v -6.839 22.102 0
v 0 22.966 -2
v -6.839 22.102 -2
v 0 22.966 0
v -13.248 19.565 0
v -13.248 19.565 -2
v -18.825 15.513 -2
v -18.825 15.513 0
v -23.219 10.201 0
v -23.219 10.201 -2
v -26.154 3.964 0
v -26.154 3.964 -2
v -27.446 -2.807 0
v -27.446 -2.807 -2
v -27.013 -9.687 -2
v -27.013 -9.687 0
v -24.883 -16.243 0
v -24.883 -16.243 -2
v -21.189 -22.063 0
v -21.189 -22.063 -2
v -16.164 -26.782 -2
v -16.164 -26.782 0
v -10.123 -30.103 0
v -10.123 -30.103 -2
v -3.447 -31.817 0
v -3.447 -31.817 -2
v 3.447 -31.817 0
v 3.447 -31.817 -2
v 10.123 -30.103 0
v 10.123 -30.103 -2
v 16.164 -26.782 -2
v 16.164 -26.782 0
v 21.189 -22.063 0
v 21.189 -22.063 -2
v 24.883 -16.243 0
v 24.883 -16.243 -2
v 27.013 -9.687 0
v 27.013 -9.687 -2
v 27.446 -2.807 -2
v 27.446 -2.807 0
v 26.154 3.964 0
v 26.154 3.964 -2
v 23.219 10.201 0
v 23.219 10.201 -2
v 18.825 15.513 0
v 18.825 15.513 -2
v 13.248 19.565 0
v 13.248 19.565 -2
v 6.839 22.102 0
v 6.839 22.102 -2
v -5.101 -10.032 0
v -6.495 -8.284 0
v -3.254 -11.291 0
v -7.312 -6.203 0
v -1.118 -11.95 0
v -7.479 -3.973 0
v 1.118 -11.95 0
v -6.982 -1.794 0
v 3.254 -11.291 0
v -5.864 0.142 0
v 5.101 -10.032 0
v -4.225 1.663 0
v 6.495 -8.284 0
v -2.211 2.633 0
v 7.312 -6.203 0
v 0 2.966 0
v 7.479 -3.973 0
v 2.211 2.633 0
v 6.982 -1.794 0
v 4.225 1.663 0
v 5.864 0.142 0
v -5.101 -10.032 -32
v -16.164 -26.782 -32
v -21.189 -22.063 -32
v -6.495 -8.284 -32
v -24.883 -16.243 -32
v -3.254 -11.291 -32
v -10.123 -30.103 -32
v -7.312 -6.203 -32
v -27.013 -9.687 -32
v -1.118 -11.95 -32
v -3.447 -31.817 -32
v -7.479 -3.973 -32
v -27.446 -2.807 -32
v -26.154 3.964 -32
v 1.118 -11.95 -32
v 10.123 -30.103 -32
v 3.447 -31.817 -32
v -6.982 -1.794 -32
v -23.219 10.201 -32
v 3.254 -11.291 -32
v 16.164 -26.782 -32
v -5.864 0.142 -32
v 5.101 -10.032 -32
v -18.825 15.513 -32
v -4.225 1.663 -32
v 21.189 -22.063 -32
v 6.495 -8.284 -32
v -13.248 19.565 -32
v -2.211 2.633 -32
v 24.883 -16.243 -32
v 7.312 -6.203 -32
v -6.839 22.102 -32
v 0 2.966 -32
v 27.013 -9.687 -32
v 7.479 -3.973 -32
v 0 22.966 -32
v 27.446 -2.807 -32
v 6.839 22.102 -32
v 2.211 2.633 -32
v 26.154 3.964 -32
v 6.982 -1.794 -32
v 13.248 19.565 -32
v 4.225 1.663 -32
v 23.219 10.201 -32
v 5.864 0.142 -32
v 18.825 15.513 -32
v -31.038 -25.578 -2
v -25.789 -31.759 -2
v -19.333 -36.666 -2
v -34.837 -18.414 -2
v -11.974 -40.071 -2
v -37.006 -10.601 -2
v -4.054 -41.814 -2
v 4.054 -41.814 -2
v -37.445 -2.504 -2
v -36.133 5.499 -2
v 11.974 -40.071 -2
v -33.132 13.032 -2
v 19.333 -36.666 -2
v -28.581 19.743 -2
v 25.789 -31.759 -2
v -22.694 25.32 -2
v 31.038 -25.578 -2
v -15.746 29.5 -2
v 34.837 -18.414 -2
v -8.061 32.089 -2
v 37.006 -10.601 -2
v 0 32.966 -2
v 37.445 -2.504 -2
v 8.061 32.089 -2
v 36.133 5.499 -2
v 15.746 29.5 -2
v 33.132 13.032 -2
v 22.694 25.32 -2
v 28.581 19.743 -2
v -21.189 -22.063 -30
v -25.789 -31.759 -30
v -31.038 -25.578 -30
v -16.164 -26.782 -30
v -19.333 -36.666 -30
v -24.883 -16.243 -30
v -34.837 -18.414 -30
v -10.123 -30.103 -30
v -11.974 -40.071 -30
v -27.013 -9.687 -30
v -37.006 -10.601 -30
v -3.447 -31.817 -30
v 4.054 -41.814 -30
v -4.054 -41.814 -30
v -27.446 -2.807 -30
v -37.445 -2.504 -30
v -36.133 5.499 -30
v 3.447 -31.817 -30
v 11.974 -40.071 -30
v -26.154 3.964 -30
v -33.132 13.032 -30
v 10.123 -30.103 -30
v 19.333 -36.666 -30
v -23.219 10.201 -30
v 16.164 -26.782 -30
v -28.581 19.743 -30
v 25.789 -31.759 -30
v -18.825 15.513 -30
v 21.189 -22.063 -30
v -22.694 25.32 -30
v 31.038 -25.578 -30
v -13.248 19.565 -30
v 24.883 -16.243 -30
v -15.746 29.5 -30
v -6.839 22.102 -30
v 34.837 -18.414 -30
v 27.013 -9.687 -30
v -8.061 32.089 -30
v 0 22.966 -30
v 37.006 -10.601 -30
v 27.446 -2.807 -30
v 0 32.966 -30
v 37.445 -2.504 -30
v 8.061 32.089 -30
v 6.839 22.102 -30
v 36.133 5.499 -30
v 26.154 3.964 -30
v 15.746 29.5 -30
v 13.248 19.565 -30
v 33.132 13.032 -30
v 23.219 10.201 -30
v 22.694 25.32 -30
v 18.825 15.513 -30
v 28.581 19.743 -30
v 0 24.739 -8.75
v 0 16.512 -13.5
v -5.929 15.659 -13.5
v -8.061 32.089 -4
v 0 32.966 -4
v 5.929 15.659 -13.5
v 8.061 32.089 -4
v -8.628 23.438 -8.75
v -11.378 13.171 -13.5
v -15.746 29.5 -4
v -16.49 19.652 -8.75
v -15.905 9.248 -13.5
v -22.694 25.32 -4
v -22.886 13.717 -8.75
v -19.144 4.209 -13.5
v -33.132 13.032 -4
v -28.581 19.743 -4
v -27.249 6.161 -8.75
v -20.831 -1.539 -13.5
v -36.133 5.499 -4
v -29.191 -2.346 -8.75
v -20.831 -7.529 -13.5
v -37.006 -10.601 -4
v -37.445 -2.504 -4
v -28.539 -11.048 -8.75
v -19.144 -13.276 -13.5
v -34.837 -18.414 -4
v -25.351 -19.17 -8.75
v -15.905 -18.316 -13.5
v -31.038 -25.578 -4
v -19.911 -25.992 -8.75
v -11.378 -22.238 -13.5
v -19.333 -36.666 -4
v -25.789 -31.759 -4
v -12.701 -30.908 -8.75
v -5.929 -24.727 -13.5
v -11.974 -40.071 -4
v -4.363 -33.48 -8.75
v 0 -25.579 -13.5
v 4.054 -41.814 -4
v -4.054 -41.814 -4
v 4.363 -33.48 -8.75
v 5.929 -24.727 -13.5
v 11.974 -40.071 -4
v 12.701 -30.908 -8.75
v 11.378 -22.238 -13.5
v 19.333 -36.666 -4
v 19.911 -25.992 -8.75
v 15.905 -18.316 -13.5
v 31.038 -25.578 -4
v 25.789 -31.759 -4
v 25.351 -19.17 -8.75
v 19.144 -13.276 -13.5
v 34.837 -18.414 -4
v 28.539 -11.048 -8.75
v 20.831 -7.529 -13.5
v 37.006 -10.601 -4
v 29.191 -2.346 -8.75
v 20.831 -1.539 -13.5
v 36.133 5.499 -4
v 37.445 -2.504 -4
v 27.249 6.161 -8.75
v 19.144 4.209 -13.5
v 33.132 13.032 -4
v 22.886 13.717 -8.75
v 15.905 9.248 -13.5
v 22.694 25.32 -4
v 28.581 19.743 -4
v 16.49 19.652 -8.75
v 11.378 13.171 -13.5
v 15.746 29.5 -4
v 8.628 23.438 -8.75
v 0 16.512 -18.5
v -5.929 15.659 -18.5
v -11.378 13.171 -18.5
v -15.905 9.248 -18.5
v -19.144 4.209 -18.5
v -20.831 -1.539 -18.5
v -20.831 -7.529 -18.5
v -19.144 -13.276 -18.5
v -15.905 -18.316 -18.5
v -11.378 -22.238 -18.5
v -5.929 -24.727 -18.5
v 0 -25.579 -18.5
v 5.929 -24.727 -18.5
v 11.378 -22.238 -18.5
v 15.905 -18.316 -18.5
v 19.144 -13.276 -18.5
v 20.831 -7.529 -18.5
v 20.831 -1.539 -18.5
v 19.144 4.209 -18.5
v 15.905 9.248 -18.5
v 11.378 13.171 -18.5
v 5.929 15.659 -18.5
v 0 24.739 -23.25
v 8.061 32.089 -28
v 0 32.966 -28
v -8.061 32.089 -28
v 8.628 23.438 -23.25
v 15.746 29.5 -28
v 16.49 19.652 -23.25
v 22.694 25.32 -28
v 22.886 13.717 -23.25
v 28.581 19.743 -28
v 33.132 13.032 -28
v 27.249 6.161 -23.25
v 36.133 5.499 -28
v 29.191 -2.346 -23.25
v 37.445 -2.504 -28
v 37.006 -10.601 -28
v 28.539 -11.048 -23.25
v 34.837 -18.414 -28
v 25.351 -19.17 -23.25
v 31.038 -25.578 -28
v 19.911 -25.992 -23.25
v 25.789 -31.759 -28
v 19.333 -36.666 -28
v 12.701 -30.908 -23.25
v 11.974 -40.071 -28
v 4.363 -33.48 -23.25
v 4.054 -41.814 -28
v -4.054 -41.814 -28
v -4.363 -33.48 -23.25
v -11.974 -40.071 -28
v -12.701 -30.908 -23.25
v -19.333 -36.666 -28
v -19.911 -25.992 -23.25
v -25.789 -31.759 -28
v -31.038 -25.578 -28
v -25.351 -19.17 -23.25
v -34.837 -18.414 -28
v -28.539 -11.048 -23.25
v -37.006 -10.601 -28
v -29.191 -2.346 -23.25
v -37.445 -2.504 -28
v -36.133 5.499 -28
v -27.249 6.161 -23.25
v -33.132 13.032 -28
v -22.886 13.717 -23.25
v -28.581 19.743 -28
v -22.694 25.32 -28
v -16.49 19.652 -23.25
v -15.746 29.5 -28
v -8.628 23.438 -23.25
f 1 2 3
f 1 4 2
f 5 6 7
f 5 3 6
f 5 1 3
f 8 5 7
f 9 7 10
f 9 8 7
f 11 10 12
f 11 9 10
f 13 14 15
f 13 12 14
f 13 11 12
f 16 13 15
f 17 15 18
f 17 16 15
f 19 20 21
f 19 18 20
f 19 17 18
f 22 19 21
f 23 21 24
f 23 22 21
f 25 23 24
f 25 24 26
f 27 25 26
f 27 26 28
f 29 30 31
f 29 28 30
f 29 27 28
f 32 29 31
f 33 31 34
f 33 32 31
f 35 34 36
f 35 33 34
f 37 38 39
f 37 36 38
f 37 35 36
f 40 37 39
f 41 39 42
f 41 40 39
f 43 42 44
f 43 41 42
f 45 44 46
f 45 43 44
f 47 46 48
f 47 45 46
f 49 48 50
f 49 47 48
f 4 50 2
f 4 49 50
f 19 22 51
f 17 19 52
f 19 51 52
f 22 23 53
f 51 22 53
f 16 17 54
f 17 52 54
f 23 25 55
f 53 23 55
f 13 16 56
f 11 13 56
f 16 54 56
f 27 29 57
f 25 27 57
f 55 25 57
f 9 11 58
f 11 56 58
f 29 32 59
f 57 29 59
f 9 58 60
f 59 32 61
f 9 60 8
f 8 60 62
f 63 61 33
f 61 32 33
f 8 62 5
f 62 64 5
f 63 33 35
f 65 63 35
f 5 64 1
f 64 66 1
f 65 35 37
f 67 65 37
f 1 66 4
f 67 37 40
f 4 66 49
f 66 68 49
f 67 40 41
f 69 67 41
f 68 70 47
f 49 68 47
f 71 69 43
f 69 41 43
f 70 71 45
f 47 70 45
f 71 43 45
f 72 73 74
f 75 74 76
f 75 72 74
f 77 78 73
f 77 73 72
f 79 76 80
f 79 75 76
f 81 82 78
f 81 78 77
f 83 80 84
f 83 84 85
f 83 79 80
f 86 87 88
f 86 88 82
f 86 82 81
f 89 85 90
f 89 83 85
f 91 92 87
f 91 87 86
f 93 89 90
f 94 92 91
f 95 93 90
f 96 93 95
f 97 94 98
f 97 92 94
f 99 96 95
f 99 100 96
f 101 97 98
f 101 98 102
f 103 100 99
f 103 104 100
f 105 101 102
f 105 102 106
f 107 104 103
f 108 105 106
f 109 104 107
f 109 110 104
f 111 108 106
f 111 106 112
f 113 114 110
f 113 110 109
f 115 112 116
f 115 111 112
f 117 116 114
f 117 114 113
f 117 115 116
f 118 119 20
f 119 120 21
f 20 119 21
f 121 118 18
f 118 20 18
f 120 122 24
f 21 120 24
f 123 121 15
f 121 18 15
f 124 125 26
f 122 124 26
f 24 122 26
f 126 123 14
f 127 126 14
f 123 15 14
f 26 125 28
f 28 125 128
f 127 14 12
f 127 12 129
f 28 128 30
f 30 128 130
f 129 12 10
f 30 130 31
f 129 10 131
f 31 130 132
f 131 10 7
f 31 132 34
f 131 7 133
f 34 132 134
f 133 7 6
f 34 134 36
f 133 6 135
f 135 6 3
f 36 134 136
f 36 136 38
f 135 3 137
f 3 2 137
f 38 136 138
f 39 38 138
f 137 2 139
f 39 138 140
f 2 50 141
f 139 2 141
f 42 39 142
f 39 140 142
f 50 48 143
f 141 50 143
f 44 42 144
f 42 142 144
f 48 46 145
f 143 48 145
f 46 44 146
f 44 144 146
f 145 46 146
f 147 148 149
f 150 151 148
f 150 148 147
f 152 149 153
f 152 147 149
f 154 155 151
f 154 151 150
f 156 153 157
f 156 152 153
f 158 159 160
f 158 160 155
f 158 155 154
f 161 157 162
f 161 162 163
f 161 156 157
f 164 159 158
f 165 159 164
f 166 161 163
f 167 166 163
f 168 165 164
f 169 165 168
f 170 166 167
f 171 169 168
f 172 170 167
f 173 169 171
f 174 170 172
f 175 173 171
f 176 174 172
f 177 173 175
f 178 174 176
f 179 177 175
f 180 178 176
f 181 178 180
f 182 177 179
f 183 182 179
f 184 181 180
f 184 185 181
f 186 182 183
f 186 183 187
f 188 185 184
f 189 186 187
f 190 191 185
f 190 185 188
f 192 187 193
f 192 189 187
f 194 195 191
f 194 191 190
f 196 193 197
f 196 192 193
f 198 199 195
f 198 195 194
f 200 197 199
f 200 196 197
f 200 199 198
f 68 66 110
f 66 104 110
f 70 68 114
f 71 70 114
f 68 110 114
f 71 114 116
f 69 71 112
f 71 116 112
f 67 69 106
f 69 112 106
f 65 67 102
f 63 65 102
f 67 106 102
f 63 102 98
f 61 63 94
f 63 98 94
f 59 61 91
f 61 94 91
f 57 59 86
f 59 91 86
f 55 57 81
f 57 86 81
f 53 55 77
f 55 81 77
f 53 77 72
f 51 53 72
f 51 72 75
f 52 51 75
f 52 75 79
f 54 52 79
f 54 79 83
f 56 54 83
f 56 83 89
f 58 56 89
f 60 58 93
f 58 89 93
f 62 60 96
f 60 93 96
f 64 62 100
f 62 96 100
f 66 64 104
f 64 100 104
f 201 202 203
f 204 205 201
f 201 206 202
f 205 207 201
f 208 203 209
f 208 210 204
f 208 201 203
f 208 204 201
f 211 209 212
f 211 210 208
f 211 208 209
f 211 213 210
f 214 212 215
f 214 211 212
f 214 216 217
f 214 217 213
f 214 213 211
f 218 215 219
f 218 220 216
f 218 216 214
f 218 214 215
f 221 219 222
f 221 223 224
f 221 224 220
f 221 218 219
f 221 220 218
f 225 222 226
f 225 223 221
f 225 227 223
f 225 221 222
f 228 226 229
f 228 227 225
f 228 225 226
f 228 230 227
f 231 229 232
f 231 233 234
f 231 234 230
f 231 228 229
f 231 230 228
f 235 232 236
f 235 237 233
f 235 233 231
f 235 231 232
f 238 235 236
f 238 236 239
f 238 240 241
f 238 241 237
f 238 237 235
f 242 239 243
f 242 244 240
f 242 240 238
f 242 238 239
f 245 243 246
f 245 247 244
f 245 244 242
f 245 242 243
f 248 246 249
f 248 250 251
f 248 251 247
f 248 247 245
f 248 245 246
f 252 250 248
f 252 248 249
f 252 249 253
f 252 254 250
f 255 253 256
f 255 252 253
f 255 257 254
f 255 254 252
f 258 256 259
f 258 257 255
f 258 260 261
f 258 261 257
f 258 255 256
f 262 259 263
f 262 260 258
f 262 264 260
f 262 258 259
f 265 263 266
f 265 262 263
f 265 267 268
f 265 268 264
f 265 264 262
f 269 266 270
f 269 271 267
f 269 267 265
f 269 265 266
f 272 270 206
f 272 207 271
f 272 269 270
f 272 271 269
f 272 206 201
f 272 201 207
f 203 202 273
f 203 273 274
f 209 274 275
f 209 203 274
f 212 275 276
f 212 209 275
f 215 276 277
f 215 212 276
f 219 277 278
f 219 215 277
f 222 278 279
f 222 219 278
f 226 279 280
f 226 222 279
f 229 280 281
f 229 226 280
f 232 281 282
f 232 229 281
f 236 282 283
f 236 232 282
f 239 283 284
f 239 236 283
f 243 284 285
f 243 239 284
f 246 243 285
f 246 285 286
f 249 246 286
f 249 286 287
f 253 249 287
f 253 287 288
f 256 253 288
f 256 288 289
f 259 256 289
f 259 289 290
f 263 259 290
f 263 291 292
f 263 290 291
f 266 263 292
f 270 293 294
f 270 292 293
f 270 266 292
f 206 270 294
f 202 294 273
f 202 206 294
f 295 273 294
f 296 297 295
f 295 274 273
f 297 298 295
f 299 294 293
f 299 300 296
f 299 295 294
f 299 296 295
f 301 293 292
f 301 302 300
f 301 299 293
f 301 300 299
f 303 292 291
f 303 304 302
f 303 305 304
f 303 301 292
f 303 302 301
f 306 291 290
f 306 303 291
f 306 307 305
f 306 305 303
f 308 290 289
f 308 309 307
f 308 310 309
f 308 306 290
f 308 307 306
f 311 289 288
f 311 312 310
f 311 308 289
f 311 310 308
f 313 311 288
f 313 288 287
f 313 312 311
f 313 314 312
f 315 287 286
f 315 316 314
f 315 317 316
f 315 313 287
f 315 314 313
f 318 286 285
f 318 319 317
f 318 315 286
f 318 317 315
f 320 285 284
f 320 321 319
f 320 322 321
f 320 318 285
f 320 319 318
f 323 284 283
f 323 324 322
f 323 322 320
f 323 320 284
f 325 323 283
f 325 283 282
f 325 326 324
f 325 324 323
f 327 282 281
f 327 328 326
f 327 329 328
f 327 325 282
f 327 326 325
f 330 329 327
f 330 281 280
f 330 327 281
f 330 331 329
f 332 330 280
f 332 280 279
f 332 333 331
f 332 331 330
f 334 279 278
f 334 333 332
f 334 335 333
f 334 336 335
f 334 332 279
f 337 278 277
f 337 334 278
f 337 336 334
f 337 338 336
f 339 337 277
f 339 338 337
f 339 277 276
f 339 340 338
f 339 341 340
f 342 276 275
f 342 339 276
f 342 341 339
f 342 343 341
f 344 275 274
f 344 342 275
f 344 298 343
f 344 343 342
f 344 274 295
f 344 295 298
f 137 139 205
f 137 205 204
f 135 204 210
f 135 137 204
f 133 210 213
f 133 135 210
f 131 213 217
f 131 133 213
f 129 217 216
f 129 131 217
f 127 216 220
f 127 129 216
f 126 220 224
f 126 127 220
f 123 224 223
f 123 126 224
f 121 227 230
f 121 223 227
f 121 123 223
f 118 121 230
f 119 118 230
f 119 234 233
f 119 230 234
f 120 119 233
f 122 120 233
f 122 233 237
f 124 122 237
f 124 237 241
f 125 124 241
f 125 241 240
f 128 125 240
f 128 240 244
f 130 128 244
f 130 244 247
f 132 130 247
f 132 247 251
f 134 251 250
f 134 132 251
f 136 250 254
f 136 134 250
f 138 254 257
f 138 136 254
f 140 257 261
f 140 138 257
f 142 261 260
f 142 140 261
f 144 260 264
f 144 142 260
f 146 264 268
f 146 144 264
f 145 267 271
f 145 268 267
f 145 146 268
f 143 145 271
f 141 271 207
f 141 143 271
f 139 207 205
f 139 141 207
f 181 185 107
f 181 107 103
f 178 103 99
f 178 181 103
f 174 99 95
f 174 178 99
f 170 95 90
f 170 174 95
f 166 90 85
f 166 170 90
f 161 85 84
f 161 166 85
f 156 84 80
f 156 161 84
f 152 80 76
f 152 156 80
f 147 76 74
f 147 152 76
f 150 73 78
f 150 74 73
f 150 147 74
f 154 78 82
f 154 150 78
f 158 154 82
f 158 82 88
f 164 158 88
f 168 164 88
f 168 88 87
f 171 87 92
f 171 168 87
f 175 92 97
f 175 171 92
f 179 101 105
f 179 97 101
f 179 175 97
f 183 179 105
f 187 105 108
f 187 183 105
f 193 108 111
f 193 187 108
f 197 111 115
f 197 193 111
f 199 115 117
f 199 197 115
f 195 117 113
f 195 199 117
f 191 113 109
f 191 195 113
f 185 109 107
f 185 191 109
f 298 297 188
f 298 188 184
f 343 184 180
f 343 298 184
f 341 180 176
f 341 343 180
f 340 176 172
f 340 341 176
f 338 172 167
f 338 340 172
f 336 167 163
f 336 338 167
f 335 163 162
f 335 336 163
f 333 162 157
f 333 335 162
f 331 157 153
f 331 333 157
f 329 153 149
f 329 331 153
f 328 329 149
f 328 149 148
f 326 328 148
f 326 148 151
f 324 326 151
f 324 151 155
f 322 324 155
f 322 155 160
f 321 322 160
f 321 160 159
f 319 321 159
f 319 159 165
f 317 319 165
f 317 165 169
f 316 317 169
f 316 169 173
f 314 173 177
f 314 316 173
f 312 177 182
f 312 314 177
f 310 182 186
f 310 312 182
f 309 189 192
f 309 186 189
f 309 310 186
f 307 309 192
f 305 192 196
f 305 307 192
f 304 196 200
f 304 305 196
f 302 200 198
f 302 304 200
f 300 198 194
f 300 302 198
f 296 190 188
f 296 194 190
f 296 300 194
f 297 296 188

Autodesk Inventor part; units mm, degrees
ref_plane "YZ Plane" through (0, 0, 0) normal (1, 0, 0) x (0, 1, 0)
ref_plane "XZ Plane" through (0, 0, 0) normal (0, 1, 0) x (-1, 0, 0)
ref_plane "XY Plane" through (0, 0, 0) normal (0, 0, 1) x (1, 0, 0)
sketch "Sketch1" plane through (0, 0, 0) normal (1, 0, 0) x (0, 1, 0)
  line L0 (2.9662, 0) -> (2.9662, -32)
  line L1 (2.9662, -32) -> (22.9662, -32)
  line L2 (22.9662, -32) -> (22.9662, -30)
  line L3 (22.9662, -30) -> (32.9662, -30)
  line L4 (32.9662, -30) -> (32.9662, -28)
  line L5 (32.9662, -28) -> (16.5117, -18.5)
  line L6 (16.5117, -18.5) -> (16.5117, -13.5)
  line L7 (16.5117, -13.5) -> (32.9662, -4)
  line L8 (32.9662, -4) -> (32.9662, -2)
  line L9 (32.9662, -2) -> (22.9662, -2)
  line L10 (22.9662, -2) -> (22.9662, 0)
  line L11 (22.9662, 0) -> (2.9662, 0)
  line L12 (0, 0) -> (34.8019, 0) construction
  line L13 (-4.5338, 0.8694) -> (-4.5338, -29.1306)
  dimension "d0" = 32
  dimension "d1" = 20
  dimension "d2" = 2
  dimension "d3" = 10
  dimension "d4" = 2
  dimension "d5" = 5
  dimension "d6" = 2
  dimension "d7" = 10
  dimension "d8" = 2
  dimension "d9" = 60
  dimension "d16" = 32.9662
  dimension "d17" = 1.8357
  dimension "d20" = 30
  dimension "d21" = 15
revolve "Revolution1" add sketch "Sketch1" angle 360 about axis through (0, -4.5338, 0.8694) along (0, 0, -1)
properties part number "Rand1"
